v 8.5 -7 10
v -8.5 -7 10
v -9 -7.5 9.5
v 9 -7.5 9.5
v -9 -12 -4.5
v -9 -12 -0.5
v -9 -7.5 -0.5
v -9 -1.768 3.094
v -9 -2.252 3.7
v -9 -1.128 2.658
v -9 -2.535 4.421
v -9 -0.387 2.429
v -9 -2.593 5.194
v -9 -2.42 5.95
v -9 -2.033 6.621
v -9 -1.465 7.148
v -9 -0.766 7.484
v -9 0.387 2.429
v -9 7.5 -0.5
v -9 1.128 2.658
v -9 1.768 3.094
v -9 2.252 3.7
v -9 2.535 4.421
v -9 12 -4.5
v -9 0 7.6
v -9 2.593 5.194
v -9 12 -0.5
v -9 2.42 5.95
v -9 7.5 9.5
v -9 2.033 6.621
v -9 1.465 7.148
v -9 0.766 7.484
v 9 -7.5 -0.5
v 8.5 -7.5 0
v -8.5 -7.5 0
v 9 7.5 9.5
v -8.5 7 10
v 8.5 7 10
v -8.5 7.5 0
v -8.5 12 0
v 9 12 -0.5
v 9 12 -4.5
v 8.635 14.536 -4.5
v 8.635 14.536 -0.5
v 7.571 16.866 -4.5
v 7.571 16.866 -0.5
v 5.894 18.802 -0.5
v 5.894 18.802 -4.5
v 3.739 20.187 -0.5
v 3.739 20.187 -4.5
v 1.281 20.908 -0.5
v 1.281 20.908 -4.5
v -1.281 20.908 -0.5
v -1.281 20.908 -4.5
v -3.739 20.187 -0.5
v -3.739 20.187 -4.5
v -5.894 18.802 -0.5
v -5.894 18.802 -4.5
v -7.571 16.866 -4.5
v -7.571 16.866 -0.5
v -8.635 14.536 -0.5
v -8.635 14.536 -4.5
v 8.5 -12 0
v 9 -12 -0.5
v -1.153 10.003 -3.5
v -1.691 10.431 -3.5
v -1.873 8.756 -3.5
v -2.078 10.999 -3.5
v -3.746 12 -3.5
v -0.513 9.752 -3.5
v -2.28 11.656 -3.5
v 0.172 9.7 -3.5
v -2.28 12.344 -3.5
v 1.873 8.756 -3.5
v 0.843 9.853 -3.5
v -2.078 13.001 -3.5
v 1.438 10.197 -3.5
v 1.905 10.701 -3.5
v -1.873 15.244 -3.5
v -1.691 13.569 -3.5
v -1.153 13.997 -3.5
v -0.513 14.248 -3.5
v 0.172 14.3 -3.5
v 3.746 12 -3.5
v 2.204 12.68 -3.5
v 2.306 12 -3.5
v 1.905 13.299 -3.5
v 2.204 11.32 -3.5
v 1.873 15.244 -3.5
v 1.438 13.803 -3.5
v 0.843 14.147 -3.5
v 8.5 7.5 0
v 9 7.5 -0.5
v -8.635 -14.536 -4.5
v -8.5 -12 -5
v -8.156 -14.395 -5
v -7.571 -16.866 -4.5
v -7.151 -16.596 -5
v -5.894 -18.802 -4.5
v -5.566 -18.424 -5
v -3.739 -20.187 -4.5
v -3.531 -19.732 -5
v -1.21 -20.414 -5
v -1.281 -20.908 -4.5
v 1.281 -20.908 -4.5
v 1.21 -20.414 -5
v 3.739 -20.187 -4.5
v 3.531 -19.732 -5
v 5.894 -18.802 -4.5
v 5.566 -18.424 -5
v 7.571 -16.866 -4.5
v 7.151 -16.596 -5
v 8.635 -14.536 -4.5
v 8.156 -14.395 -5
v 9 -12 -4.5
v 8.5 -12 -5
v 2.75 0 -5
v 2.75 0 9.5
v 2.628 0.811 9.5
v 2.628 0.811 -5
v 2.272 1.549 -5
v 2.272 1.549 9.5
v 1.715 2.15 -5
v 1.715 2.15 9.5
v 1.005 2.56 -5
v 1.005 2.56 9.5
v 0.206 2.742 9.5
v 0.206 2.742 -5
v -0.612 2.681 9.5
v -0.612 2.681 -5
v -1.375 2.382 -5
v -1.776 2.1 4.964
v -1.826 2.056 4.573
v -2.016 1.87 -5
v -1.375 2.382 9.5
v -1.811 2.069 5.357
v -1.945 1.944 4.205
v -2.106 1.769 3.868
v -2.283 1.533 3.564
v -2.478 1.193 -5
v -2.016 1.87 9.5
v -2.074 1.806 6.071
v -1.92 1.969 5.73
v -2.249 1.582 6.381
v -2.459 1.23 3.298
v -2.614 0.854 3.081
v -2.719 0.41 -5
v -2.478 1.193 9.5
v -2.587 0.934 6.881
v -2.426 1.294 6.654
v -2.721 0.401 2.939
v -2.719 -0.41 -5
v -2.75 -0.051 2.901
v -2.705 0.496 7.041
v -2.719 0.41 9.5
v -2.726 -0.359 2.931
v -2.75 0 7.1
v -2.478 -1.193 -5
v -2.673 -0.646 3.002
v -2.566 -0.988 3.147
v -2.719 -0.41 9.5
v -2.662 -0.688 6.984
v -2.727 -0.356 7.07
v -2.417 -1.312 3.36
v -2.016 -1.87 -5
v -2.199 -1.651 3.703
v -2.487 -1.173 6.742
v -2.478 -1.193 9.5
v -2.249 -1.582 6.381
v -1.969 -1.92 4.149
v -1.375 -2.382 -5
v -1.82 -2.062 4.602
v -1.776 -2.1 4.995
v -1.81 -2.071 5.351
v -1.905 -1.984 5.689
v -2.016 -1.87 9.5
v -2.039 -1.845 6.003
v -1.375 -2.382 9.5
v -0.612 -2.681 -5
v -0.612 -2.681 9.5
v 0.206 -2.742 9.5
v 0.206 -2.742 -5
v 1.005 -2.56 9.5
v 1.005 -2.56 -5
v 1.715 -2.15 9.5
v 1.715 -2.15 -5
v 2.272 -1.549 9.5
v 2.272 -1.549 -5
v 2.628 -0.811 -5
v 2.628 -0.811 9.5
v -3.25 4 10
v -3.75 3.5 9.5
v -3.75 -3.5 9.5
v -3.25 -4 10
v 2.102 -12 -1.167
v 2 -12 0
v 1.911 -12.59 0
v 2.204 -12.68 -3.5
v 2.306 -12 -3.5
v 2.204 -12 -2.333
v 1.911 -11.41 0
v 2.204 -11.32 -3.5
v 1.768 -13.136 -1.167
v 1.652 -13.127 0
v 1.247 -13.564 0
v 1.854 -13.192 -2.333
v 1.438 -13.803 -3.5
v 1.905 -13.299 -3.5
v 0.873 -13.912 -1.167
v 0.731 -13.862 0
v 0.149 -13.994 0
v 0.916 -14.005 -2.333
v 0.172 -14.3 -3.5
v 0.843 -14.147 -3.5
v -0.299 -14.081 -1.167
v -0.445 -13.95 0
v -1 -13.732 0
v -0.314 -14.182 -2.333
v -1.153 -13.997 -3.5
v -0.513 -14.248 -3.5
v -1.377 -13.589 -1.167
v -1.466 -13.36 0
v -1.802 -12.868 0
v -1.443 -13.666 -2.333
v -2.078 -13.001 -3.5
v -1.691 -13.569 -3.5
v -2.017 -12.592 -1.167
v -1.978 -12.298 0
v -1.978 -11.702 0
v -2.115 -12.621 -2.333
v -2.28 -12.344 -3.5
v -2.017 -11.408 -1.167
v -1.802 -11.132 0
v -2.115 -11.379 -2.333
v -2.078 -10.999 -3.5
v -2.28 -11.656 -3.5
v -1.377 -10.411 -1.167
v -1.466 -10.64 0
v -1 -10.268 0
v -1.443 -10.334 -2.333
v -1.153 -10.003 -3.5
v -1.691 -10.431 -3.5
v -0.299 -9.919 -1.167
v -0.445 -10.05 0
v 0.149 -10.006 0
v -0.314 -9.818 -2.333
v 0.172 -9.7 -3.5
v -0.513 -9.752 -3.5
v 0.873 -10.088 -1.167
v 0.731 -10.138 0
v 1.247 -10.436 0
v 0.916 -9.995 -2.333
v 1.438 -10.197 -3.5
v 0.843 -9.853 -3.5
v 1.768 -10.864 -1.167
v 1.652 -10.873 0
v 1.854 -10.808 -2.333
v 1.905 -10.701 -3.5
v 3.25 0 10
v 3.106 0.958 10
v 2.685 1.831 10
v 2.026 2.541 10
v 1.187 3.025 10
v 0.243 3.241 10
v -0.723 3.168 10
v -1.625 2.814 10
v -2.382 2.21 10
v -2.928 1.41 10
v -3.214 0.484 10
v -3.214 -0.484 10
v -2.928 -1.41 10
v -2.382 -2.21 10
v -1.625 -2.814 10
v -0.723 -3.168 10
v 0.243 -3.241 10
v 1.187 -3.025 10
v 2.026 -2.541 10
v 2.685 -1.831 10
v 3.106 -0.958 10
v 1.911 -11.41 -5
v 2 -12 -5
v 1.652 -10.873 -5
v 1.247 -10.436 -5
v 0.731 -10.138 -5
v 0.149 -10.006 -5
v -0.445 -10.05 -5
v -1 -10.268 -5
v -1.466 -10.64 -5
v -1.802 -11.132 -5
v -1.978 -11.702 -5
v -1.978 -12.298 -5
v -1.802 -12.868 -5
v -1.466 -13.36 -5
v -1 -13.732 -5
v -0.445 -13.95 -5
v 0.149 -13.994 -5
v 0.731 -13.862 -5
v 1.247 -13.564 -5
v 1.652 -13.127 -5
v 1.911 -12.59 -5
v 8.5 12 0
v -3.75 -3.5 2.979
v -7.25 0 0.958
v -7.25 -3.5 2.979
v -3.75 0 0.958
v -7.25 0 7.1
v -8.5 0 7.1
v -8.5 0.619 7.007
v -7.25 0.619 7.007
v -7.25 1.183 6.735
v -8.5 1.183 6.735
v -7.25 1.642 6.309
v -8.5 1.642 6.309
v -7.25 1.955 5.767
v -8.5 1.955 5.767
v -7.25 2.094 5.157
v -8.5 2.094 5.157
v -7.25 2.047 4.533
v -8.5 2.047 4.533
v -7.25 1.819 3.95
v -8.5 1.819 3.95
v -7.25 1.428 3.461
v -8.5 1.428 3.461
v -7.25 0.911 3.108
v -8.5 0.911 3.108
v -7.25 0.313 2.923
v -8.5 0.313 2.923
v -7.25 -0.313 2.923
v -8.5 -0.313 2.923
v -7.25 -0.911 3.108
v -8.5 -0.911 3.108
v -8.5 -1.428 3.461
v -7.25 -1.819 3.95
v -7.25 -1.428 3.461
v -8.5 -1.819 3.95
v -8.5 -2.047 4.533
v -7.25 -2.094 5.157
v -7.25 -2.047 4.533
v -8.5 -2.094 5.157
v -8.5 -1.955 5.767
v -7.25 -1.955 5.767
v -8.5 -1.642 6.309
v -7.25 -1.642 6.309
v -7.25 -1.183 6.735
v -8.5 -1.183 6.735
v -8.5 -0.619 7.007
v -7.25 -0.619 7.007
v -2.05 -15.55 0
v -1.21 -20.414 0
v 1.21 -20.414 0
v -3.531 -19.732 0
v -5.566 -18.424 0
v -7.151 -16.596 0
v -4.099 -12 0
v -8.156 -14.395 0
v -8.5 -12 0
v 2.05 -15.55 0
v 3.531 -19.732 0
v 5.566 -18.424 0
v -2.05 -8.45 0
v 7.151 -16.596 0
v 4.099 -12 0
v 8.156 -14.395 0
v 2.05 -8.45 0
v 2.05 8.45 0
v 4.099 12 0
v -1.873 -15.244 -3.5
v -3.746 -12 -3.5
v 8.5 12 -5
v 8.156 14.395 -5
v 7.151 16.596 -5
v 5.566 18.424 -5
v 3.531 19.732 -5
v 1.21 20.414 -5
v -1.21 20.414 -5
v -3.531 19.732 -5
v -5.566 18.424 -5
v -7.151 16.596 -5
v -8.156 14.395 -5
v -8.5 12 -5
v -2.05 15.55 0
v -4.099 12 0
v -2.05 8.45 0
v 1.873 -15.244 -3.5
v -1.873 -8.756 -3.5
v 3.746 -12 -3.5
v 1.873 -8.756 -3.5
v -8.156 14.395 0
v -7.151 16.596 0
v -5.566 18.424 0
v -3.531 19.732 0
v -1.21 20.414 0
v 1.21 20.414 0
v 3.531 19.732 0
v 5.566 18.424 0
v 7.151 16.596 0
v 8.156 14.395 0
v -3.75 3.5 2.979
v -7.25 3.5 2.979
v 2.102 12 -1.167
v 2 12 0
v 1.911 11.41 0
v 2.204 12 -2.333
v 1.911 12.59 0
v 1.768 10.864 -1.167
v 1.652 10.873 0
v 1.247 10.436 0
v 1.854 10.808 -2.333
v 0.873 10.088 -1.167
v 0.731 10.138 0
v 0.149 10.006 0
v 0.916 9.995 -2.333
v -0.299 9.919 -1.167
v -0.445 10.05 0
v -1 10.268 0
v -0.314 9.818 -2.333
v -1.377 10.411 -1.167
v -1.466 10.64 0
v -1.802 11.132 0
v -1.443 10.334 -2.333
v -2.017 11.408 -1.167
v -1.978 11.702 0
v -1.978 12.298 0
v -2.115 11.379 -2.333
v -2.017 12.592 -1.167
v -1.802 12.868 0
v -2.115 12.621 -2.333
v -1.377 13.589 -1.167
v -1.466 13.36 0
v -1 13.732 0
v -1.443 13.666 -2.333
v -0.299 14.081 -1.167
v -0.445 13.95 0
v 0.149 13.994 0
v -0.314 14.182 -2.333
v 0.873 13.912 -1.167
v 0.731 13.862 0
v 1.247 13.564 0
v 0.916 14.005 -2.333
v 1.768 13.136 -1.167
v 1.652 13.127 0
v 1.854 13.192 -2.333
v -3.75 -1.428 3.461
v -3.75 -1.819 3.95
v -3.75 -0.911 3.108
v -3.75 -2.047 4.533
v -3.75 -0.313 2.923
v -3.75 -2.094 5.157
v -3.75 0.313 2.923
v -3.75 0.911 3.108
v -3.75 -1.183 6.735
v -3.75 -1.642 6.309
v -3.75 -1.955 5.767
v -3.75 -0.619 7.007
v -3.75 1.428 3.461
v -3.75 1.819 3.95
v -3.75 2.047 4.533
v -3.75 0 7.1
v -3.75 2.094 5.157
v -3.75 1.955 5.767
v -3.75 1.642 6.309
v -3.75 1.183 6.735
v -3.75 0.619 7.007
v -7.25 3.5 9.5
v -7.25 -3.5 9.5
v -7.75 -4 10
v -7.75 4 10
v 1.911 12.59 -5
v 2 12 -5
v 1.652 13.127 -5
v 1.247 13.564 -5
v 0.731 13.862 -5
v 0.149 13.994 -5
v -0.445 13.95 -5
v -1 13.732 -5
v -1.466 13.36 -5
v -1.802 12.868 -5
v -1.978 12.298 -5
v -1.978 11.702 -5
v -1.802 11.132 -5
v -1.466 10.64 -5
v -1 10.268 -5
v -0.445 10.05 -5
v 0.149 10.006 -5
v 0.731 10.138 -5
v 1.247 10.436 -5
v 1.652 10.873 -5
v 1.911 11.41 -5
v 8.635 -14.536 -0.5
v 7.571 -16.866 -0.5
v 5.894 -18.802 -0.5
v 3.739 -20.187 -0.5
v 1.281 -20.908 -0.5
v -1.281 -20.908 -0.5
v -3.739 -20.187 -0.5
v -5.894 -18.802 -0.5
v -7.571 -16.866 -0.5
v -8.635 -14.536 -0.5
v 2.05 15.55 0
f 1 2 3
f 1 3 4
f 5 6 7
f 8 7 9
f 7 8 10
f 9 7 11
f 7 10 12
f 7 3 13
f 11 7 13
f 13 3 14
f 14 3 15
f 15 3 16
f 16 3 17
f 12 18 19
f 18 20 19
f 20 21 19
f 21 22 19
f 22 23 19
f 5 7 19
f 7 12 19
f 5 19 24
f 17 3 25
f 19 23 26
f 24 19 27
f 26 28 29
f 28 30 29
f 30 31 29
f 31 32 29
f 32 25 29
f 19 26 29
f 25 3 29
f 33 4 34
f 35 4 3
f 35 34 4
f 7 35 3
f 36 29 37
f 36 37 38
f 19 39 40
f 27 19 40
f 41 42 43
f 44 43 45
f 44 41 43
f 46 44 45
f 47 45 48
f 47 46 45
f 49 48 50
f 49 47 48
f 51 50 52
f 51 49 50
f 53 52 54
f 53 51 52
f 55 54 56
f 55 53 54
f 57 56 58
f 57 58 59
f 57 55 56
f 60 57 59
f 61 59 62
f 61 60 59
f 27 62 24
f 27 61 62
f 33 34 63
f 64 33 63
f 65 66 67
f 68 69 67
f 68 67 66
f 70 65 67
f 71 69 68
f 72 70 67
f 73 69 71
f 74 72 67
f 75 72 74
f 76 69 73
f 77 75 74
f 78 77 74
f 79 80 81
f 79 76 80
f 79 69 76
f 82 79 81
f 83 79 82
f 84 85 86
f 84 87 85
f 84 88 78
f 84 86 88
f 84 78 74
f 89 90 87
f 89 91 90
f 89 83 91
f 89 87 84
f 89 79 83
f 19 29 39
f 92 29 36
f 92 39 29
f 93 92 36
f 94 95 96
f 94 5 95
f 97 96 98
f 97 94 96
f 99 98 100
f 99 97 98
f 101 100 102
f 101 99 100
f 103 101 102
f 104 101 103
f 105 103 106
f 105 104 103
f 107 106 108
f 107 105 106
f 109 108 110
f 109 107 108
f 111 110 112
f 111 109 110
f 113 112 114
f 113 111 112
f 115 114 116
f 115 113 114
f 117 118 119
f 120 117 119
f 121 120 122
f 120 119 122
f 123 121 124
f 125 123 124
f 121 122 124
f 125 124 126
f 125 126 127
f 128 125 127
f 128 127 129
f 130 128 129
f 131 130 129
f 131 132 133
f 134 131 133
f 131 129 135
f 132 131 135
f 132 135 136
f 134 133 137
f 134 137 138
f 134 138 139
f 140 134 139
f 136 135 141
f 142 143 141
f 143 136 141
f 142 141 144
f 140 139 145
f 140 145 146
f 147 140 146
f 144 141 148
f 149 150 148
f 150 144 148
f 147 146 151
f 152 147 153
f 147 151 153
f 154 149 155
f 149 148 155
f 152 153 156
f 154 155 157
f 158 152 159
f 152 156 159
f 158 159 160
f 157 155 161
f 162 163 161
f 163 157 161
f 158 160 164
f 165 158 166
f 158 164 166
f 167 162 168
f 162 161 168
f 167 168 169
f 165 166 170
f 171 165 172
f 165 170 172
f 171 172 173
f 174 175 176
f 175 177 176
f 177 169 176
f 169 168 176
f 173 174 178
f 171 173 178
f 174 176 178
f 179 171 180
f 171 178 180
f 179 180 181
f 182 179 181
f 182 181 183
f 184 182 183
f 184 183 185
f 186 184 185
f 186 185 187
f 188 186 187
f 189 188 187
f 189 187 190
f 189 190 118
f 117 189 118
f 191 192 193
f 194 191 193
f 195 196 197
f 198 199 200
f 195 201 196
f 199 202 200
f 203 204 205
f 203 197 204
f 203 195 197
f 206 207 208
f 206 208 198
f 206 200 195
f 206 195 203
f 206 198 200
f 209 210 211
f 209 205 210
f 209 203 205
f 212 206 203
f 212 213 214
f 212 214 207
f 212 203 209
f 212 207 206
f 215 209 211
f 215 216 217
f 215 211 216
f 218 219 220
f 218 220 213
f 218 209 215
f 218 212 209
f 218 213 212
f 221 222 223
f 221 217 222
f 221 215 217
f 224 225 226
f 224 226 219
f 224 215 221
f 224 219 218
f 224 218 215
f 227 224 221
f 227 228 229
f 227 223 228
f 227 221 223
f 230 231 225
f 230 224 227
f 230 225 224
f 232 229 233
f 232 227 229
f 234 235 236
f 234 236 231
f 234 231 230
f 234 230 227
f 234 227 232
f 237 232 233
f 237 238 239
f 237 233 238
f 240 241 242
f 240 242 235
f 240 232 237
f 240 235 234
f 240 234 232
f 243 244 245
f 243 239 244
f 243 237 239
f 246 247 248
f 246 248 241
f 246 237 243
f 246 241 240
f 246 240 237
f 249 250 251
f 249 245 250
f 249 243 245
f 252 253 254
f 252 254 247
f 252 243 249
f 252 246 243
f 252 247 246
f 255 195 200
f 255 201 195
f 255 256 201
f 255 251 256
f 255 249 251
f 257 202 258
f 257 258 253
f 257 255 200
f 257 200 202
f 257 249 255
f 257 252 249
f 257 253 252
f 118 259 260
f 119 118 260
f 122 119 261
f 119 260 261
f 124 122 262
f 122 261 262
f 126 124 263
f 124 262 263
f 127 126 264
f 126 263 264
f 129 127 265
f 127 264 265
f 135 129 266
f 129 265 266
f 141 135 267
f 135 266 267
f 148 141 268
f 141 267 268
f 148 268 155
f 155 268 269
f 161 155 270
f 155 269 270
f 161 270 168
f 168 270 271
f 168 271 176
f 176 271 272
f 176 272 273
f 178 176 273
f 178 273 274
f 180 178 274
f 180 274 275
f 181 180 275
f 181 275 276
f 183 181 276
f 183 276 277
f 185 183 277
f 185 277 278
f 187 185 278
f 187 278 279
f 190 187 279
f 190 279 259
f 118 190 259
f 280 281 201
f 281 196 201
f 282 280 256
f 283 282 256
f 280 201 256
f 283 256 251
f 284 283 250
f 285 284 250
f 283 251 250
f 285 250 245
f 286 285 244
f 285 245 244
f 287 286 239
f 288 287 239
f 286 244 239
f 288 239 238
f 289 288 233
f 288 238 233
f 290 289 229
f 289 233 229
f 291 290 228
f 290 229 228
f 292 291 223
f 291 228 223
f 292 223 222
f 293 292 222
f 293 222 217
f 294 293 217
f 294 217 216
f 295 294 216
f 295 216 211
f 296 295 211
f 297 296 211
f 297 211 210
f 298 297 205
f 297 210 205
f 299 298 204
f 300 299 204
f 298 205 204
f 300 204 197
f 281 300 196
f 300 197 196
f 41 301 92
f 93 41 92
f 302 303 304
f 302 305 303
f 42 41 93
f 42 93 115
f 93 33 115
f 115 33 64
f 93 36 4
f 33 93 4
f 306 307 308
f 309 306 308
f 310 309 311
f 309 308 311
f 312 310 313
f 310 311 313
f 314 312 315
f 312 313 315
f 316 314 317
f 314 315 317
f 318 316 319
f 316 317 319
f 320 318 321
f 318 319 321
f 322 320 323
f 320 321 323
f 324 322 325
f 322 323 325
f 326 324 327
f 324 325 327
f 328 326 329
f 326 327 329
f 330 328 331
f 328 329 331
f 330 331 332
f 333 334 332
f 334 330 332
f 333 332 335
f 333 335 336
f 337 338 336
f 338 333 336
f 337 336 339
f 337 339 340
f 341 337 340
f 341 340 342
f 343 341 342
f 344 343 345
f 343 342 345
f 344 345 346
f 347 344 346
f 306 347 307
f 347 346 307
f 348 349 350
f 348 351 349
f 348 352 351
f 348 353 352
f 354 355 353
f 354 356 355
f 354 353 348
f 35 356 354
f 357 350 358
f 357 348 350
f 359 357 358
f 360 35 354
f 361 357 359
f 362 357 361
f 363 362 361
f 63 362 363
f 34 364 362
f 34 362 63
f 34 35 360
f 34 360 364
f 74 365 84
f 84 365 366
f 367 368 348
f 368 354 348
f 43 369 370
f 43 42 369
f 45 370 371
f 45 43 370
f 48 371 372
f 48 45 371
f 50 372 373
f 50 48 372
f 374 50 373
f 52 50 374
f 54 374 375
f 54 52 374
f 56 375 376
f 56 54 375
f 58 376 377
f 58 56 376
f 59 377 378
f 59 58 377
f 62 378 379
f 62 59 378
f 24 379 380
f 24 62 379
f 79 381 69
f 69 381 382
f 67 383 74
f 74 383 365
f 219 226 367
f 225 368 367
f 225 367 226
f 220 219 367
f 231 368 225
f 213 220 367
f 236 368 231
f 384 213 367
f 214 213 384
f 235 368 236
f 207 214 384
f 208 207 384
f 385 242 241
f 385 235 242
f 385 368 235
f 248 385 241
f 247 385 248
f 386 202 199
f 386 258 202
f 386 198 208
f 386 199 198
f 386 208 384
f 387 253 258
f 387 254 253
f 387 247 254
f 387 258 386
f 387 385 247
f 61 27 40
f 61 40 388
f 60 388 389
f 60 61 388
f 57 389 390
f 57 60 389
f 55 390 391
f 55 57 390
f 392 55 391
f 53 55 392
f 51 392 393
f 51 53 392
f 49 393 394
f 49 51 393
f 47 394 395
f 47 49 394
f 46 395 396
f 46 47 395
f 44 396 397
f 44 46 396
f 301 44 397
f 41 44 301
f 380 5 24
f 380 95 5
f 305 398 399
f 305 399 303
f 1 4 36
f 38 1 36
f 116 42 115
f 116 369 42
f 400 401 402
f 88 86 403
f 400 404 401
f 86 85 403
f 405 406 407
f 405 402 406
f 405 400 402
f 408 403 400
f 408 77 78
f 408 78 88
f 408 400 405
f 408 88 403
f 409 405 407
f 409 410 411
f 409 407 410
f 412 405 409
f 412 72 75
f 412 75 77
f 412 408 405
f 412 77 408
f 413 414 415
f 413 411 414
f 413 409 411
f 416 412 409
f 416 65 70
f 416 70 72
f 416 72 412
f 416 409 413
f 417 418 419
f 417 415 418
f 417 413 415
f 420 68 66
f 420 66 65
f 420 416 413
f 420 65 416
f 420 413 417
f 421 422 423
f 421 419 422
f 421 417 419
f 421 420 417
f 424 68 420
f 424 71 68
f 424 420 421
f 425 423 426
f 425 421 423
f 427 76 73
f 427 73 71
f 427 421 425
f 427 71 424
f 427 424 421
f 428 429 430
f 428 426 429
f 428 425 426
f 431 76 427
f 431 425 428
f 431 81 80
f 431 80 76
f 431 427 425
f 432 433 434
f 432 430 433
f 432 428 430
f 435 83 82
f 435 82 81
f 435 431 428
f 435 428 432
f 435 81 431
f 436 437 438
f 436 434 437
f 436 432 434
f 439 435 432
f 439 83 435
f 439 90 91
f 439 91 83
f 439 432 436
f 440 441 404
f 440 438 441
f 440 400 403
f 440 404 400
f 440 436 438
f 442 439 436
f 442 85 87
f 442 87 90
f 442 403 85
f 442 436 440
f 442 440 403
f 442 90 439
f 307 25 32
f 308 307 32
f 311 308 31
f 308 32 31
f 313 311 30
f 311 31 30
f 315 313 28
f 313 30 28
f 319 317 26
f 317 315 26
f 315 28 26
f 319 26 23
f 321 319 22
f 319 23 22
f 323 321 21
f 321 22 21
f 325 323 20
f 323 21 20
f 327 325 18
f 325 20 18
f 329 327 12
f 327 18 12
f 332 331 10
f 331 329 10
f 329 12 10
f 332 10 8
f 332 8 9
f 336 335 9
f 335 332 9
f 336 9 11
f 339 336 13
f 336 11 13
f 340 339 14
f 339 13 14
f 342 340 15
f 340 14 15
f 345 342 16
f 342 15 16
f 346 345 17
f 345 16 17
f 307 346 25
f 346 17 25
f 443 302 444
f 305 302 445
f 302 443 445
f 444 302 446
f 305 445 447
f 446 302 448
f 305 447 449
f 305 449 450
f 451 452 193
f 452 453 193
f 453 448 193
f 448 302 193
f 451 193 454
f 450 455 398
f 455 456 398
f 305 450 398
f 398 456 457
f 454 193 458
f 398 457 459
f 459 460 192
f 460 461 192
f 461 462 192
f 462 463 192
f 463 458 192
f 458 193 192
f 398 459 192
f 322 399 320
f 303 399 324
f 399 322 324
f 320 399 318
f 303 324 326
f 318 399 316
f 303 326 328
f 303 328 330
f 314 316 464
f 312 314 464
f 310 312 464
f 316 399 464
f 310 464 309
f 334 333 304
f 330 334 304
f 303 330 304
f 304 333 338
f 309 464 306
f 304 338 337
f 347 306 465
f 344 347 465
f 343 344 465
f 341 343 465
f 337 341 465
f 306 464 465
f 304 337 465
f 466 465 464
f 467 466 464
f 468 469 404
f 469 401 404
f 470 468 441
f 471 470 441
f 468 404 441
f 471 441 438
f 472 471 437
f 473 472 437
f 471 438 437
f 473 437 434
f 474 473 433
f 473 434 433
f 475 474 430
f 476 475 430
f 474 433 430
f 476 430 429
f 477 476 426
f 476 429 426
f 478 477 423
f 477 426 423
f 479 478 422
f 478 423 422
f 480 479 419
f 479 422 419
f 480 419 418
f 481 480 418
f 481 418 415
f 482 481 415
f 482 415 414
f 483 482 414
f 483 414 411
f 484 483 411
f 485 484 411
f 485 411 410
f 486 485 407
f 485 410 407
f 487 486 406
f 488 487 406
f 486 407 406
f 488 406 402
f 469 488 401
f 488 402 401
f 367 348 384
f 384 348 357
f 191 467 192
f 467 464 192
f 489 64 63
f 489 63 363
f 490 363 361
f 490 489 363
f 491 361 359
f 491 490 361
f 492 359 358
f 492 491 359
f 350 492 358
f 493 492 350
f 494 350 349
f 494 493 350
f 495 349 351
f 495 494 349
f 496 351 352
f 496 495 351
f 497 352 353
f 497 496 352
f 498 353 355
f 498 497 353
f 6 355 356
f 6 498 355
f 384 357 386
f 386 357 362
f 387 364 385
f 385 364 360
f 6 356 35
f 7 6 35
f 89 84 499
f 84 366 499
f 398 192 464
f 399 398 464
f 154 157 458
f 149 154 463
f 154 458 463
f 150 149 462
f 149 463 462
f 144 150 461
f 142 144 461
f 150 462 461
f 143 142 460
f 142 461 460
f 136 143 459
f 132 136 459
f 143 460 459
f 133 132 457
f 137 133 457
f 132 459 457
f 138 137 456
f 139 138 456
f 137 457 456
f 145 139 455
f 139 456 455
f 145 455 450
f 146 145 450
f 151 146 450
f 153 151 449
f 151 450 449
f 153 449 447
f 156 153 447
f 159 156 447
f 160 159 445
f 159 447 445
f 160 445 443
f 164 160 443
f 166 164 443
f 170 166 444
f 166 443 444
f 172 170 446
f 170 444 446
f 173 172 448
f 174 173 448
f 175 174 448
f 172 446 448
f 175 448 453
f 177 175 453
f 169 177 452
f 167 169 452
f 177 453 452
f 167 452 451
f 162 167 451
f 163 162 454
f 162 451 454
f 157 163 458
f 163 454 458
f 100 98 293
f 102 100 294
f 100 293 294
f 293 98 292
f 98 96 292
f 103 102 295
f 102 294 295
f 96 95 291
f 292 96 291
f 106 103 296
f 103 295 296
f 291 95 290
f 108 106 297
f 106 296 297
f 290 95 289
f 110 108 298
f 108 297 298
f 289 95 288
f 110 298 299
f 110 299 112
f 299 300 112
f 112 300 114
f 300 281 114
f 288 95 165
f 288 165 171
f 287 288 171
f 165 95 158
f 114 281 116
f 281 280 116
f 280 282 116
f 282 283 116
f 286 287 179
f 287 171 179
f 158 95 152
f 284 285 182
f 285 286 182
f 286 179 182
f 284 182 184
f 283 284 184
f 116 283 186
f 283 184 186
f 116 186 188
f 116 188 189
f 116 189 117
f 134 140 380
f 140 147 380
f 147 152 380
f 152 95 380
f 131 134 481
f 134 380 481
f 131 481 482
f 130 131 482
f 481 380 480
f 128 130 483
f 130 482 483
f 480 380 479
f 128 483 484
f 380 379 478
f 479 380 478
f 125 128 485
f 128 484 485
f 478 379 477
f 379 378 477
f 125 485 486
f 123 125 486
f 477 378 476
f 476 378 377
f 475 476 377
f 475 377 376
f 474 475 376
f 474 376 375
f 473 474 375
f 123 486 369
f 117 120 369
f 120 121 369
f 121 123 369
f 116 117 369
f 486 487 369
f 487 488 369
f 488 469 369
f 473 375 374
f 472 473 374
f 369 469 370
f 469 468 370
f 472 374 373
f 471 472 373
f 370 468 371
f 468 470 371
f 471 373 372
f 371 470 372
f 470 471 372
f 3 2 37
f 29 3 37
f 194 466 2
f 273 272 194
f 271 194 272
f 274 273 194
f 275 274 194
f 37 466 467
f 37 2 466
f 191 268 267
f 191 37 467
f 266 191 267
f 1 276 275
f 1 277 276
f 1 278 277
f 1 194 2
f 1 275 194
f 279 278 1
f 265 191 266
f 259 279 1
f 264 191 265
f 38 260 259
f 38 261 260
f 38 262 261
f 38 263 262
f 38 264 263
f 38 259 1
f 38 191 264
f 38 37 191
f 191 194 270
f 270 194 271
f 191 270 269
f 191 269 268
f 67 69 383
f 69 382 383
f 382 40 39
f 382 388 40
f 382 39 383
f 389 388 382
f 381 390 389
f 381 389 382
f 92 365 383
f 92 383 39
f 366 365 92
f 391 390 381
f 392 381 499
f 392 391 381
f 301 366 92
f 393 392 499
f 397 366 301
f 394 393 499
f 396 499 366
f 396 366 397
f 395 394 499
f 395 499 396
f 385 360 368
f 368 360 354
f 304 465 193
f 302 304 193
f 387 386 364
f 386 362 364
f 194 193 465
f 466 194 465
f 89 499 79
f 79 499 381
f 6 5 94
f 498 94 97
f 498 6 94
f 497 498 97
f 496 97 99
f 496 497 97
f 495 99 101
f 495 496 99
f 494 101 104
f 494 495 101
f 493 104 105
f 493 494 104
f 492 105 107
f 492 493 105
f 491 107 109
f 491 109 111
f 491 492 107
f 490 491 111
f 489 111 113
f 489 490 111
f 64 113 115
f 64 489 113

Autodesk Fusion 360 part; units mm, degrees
sketch "Sketch1" plane through (0, 0, 0) normal (0, 0, 1) x (1, 0, 0)
  line L0 (-9, -12) -> (-9, 12)
  line L1 (9, 12) -> (9, -12)
  line L2 (9, -21) -> (-9, 21) construction
  line L3 (-9, -21) -> (9, 21) construction
  line L4 (9, -7.5) -> (-9, -7.5)
  line L5 (-9, -7.5) -> (-9, 7.5)
  line L6 (-9, 7.5) -> (9, 7.5)
  line L7 (9, 7.5) -> (9, -7.5)
  line L8 (9, -7.5) -> (-9, 7.5) construction
  line L9 (-9, -7.5) -> (9, 7.5) construction
  circle A0 centre (0, 0) radius 2.75
  arc A1 (0, 21) -> (-9, 12) centre (0, 12) ccw
  arc A2 (9, 12) -> (0, 21) centre (0, 12) ccw
  arc A3 (0, -21) -> (9, -12) centre (0, -12) ccw
  arc A4 (-9, -12) -> (0, -21) centre (0, -12) ccw
  line L10 (0, -21.9731) -> (0, 33.0269) construction
  line L11 (2.0496, 8.45) -> (4.0992, 12)
  line L12 (4.0992, 12) -> (2.0496, 15.55)
  line L13 (2.0496, 15.55) -> (-2.0496, 15.55)
  line L14 (-2.0496, 15.55) -> (-4.0992, 12)
  line L15 (-4.0992, 12) -> (-2.0496, 8.45)
  line L16 (-2.0496, 8.45) -> (2.0496, 8.45)
  line L17 (2.0496, -15.55) -> (4.0992, -12)
  line L18 (4.0992, -12) -> (2.0496, -8.45)
  line L19 (2.0496, -8.45) -> (-2.0496, -8.45)
  line L20 (-2.0496, -8.45) -> (-4.0992, -12)
  line L21 (-4.0992, -12) -> (-2.0496, -15.55)
  line L22 (-2.0496, -15.55) -> (2.0496, -15.55)
  circle A5 centre (0, 12) radius 2
  circle A6 centre (0, -12) radius 2
  line L23 (-9, 0) -> (0, 0) construction
  line L24 (-3.75, 3.5) -> (-7.25, 3.5)
  line L25 (-7.25, 3.5) -> (-7.25, -3.5)
  line L26 (-7.25, -3.5) -> (-3.75, -3.5)
  line L27 (-3.75, -3.5) -> (-3.75, 3.5)
  line L28 (-3.75, 3.5) -> (-7.25, -3.5) construction
  line L29 (-7.25, 3.5) -> (-3.75, -3.5) construction
  point P0 (0, 12)
  point P1 (0, -12)
  point P2 (-5.5, 0)
  dimension "d14" = 18
  dimension "d15" = 42
  dimension "d16" = 18
  dimension "d17" = 15
  dimension "d18" = 5.5
  dimension "d19" = 9
  dimension "d20" = 12
  dimension "d21" = 12
  dimension "d22" = 3.55
  dimension "d23" = 3.55
  dimension "d24" = 4
  dimension "d25" = 4
  dimension "d26" = 3.5
  dimension "d27" = 7
  dimension "d28" = 3.5
extrude "Extrude1" add sketch "Sketch1" against normal blind 5 contours L0 L1 L4 A3 A4 | L0 L1 L4 L5 L6 L7 | L0 L1 L6 A1 A2 | L11 L12 L13 L14 L15 L16 | L17 L18 L19 L20 L21 L22 | L24 L25 L26 L27
extrude "Extrude2" add sketch "Sketch1" along normal blind 10 contours L0 L1 L4 L5 L6 L7 | L24 L25 L26 L27
extrude "Extrude3" cut sketch "Sketch1" against normal blind 3.5 draft -5 contours L11 L12 L13 L14 L15 L16 | L17 L18 L19 L20 L21 L22 | A5 | A6
extrude "Extrude4" cut sketch "Sketch1" against normal blind 5 from surface at 10 contours L24 L25 L26 L27
sketch "Sketch2" plane through (-3.75, 0, 0) normal (-1, 0, 0) x (0, 0, 1)
  line L0 (10, -3.5) -> (10, 3.5)
  line L1 (10, 3.5) -> (5, 3.5)
  line L2 (5, 3.5) -> (5, -3.5)
  line L3 (5, -3.5) -> (10, -3.5)
  line L4 (9.0415, 0) -> (7.0207, 3.5)
  line L5 (7.0207, 3.5) -> (2.9793, 3.5)
  line L6 (2.9793, 3.5) -> (0.9585, 0)
  line L7 (0.9585, 0) -> (2.9793, -3.5)
  line L8 (2.9793, -3.5) -> (7.0207, -3.5)
  line L9 (7.0207, -3.5) -> (9.0415, 0)
  circle A0 centre (5, 0) radius 2.1
  point P0 (5, 0)
  dimension "d38" = 3.5
  dimension "d41" = 4.2
extrude "Extrude5" cut sketch "Sketch2" along normal up to surface (3.5 mm away) contours L1 L2 L3 L4 L5 L8 L9 A0 | L2 L5 L6 L7 L8 A0 | L2 A0 | L2 A0
extrude "Extrude6" cut sketch "Sketch2" against normal blind 9 from surface at 5.25 contours L2 A0 | L2 A0
chamfer "Chamfer1" distance 0.5 angle 45 19 edges at (-2.5639, 0.9944, 10) (-5.5, 3.5, 10) (-5.5, -3.5, 10) (-7.25, 0, 10) (-9, 0.7594, 3.0421) (-9, 9.75, 0) (0, 21, 0) (9, 9.75, 0) (0, -21, 0) (9, -9.75, 0) (-9, -9.75, 0) (0, 7.5, 10) (9, 0, 10) (0, -7.5, 10) (-9, 0, 10) (-9, 0, -5) (0, 21, -5) (9, 0, -5) (0, -21, -5)
chamfer "Chamfer1" distance 0.5 angle 45 1 edges at (-3.75, 0, 10)
